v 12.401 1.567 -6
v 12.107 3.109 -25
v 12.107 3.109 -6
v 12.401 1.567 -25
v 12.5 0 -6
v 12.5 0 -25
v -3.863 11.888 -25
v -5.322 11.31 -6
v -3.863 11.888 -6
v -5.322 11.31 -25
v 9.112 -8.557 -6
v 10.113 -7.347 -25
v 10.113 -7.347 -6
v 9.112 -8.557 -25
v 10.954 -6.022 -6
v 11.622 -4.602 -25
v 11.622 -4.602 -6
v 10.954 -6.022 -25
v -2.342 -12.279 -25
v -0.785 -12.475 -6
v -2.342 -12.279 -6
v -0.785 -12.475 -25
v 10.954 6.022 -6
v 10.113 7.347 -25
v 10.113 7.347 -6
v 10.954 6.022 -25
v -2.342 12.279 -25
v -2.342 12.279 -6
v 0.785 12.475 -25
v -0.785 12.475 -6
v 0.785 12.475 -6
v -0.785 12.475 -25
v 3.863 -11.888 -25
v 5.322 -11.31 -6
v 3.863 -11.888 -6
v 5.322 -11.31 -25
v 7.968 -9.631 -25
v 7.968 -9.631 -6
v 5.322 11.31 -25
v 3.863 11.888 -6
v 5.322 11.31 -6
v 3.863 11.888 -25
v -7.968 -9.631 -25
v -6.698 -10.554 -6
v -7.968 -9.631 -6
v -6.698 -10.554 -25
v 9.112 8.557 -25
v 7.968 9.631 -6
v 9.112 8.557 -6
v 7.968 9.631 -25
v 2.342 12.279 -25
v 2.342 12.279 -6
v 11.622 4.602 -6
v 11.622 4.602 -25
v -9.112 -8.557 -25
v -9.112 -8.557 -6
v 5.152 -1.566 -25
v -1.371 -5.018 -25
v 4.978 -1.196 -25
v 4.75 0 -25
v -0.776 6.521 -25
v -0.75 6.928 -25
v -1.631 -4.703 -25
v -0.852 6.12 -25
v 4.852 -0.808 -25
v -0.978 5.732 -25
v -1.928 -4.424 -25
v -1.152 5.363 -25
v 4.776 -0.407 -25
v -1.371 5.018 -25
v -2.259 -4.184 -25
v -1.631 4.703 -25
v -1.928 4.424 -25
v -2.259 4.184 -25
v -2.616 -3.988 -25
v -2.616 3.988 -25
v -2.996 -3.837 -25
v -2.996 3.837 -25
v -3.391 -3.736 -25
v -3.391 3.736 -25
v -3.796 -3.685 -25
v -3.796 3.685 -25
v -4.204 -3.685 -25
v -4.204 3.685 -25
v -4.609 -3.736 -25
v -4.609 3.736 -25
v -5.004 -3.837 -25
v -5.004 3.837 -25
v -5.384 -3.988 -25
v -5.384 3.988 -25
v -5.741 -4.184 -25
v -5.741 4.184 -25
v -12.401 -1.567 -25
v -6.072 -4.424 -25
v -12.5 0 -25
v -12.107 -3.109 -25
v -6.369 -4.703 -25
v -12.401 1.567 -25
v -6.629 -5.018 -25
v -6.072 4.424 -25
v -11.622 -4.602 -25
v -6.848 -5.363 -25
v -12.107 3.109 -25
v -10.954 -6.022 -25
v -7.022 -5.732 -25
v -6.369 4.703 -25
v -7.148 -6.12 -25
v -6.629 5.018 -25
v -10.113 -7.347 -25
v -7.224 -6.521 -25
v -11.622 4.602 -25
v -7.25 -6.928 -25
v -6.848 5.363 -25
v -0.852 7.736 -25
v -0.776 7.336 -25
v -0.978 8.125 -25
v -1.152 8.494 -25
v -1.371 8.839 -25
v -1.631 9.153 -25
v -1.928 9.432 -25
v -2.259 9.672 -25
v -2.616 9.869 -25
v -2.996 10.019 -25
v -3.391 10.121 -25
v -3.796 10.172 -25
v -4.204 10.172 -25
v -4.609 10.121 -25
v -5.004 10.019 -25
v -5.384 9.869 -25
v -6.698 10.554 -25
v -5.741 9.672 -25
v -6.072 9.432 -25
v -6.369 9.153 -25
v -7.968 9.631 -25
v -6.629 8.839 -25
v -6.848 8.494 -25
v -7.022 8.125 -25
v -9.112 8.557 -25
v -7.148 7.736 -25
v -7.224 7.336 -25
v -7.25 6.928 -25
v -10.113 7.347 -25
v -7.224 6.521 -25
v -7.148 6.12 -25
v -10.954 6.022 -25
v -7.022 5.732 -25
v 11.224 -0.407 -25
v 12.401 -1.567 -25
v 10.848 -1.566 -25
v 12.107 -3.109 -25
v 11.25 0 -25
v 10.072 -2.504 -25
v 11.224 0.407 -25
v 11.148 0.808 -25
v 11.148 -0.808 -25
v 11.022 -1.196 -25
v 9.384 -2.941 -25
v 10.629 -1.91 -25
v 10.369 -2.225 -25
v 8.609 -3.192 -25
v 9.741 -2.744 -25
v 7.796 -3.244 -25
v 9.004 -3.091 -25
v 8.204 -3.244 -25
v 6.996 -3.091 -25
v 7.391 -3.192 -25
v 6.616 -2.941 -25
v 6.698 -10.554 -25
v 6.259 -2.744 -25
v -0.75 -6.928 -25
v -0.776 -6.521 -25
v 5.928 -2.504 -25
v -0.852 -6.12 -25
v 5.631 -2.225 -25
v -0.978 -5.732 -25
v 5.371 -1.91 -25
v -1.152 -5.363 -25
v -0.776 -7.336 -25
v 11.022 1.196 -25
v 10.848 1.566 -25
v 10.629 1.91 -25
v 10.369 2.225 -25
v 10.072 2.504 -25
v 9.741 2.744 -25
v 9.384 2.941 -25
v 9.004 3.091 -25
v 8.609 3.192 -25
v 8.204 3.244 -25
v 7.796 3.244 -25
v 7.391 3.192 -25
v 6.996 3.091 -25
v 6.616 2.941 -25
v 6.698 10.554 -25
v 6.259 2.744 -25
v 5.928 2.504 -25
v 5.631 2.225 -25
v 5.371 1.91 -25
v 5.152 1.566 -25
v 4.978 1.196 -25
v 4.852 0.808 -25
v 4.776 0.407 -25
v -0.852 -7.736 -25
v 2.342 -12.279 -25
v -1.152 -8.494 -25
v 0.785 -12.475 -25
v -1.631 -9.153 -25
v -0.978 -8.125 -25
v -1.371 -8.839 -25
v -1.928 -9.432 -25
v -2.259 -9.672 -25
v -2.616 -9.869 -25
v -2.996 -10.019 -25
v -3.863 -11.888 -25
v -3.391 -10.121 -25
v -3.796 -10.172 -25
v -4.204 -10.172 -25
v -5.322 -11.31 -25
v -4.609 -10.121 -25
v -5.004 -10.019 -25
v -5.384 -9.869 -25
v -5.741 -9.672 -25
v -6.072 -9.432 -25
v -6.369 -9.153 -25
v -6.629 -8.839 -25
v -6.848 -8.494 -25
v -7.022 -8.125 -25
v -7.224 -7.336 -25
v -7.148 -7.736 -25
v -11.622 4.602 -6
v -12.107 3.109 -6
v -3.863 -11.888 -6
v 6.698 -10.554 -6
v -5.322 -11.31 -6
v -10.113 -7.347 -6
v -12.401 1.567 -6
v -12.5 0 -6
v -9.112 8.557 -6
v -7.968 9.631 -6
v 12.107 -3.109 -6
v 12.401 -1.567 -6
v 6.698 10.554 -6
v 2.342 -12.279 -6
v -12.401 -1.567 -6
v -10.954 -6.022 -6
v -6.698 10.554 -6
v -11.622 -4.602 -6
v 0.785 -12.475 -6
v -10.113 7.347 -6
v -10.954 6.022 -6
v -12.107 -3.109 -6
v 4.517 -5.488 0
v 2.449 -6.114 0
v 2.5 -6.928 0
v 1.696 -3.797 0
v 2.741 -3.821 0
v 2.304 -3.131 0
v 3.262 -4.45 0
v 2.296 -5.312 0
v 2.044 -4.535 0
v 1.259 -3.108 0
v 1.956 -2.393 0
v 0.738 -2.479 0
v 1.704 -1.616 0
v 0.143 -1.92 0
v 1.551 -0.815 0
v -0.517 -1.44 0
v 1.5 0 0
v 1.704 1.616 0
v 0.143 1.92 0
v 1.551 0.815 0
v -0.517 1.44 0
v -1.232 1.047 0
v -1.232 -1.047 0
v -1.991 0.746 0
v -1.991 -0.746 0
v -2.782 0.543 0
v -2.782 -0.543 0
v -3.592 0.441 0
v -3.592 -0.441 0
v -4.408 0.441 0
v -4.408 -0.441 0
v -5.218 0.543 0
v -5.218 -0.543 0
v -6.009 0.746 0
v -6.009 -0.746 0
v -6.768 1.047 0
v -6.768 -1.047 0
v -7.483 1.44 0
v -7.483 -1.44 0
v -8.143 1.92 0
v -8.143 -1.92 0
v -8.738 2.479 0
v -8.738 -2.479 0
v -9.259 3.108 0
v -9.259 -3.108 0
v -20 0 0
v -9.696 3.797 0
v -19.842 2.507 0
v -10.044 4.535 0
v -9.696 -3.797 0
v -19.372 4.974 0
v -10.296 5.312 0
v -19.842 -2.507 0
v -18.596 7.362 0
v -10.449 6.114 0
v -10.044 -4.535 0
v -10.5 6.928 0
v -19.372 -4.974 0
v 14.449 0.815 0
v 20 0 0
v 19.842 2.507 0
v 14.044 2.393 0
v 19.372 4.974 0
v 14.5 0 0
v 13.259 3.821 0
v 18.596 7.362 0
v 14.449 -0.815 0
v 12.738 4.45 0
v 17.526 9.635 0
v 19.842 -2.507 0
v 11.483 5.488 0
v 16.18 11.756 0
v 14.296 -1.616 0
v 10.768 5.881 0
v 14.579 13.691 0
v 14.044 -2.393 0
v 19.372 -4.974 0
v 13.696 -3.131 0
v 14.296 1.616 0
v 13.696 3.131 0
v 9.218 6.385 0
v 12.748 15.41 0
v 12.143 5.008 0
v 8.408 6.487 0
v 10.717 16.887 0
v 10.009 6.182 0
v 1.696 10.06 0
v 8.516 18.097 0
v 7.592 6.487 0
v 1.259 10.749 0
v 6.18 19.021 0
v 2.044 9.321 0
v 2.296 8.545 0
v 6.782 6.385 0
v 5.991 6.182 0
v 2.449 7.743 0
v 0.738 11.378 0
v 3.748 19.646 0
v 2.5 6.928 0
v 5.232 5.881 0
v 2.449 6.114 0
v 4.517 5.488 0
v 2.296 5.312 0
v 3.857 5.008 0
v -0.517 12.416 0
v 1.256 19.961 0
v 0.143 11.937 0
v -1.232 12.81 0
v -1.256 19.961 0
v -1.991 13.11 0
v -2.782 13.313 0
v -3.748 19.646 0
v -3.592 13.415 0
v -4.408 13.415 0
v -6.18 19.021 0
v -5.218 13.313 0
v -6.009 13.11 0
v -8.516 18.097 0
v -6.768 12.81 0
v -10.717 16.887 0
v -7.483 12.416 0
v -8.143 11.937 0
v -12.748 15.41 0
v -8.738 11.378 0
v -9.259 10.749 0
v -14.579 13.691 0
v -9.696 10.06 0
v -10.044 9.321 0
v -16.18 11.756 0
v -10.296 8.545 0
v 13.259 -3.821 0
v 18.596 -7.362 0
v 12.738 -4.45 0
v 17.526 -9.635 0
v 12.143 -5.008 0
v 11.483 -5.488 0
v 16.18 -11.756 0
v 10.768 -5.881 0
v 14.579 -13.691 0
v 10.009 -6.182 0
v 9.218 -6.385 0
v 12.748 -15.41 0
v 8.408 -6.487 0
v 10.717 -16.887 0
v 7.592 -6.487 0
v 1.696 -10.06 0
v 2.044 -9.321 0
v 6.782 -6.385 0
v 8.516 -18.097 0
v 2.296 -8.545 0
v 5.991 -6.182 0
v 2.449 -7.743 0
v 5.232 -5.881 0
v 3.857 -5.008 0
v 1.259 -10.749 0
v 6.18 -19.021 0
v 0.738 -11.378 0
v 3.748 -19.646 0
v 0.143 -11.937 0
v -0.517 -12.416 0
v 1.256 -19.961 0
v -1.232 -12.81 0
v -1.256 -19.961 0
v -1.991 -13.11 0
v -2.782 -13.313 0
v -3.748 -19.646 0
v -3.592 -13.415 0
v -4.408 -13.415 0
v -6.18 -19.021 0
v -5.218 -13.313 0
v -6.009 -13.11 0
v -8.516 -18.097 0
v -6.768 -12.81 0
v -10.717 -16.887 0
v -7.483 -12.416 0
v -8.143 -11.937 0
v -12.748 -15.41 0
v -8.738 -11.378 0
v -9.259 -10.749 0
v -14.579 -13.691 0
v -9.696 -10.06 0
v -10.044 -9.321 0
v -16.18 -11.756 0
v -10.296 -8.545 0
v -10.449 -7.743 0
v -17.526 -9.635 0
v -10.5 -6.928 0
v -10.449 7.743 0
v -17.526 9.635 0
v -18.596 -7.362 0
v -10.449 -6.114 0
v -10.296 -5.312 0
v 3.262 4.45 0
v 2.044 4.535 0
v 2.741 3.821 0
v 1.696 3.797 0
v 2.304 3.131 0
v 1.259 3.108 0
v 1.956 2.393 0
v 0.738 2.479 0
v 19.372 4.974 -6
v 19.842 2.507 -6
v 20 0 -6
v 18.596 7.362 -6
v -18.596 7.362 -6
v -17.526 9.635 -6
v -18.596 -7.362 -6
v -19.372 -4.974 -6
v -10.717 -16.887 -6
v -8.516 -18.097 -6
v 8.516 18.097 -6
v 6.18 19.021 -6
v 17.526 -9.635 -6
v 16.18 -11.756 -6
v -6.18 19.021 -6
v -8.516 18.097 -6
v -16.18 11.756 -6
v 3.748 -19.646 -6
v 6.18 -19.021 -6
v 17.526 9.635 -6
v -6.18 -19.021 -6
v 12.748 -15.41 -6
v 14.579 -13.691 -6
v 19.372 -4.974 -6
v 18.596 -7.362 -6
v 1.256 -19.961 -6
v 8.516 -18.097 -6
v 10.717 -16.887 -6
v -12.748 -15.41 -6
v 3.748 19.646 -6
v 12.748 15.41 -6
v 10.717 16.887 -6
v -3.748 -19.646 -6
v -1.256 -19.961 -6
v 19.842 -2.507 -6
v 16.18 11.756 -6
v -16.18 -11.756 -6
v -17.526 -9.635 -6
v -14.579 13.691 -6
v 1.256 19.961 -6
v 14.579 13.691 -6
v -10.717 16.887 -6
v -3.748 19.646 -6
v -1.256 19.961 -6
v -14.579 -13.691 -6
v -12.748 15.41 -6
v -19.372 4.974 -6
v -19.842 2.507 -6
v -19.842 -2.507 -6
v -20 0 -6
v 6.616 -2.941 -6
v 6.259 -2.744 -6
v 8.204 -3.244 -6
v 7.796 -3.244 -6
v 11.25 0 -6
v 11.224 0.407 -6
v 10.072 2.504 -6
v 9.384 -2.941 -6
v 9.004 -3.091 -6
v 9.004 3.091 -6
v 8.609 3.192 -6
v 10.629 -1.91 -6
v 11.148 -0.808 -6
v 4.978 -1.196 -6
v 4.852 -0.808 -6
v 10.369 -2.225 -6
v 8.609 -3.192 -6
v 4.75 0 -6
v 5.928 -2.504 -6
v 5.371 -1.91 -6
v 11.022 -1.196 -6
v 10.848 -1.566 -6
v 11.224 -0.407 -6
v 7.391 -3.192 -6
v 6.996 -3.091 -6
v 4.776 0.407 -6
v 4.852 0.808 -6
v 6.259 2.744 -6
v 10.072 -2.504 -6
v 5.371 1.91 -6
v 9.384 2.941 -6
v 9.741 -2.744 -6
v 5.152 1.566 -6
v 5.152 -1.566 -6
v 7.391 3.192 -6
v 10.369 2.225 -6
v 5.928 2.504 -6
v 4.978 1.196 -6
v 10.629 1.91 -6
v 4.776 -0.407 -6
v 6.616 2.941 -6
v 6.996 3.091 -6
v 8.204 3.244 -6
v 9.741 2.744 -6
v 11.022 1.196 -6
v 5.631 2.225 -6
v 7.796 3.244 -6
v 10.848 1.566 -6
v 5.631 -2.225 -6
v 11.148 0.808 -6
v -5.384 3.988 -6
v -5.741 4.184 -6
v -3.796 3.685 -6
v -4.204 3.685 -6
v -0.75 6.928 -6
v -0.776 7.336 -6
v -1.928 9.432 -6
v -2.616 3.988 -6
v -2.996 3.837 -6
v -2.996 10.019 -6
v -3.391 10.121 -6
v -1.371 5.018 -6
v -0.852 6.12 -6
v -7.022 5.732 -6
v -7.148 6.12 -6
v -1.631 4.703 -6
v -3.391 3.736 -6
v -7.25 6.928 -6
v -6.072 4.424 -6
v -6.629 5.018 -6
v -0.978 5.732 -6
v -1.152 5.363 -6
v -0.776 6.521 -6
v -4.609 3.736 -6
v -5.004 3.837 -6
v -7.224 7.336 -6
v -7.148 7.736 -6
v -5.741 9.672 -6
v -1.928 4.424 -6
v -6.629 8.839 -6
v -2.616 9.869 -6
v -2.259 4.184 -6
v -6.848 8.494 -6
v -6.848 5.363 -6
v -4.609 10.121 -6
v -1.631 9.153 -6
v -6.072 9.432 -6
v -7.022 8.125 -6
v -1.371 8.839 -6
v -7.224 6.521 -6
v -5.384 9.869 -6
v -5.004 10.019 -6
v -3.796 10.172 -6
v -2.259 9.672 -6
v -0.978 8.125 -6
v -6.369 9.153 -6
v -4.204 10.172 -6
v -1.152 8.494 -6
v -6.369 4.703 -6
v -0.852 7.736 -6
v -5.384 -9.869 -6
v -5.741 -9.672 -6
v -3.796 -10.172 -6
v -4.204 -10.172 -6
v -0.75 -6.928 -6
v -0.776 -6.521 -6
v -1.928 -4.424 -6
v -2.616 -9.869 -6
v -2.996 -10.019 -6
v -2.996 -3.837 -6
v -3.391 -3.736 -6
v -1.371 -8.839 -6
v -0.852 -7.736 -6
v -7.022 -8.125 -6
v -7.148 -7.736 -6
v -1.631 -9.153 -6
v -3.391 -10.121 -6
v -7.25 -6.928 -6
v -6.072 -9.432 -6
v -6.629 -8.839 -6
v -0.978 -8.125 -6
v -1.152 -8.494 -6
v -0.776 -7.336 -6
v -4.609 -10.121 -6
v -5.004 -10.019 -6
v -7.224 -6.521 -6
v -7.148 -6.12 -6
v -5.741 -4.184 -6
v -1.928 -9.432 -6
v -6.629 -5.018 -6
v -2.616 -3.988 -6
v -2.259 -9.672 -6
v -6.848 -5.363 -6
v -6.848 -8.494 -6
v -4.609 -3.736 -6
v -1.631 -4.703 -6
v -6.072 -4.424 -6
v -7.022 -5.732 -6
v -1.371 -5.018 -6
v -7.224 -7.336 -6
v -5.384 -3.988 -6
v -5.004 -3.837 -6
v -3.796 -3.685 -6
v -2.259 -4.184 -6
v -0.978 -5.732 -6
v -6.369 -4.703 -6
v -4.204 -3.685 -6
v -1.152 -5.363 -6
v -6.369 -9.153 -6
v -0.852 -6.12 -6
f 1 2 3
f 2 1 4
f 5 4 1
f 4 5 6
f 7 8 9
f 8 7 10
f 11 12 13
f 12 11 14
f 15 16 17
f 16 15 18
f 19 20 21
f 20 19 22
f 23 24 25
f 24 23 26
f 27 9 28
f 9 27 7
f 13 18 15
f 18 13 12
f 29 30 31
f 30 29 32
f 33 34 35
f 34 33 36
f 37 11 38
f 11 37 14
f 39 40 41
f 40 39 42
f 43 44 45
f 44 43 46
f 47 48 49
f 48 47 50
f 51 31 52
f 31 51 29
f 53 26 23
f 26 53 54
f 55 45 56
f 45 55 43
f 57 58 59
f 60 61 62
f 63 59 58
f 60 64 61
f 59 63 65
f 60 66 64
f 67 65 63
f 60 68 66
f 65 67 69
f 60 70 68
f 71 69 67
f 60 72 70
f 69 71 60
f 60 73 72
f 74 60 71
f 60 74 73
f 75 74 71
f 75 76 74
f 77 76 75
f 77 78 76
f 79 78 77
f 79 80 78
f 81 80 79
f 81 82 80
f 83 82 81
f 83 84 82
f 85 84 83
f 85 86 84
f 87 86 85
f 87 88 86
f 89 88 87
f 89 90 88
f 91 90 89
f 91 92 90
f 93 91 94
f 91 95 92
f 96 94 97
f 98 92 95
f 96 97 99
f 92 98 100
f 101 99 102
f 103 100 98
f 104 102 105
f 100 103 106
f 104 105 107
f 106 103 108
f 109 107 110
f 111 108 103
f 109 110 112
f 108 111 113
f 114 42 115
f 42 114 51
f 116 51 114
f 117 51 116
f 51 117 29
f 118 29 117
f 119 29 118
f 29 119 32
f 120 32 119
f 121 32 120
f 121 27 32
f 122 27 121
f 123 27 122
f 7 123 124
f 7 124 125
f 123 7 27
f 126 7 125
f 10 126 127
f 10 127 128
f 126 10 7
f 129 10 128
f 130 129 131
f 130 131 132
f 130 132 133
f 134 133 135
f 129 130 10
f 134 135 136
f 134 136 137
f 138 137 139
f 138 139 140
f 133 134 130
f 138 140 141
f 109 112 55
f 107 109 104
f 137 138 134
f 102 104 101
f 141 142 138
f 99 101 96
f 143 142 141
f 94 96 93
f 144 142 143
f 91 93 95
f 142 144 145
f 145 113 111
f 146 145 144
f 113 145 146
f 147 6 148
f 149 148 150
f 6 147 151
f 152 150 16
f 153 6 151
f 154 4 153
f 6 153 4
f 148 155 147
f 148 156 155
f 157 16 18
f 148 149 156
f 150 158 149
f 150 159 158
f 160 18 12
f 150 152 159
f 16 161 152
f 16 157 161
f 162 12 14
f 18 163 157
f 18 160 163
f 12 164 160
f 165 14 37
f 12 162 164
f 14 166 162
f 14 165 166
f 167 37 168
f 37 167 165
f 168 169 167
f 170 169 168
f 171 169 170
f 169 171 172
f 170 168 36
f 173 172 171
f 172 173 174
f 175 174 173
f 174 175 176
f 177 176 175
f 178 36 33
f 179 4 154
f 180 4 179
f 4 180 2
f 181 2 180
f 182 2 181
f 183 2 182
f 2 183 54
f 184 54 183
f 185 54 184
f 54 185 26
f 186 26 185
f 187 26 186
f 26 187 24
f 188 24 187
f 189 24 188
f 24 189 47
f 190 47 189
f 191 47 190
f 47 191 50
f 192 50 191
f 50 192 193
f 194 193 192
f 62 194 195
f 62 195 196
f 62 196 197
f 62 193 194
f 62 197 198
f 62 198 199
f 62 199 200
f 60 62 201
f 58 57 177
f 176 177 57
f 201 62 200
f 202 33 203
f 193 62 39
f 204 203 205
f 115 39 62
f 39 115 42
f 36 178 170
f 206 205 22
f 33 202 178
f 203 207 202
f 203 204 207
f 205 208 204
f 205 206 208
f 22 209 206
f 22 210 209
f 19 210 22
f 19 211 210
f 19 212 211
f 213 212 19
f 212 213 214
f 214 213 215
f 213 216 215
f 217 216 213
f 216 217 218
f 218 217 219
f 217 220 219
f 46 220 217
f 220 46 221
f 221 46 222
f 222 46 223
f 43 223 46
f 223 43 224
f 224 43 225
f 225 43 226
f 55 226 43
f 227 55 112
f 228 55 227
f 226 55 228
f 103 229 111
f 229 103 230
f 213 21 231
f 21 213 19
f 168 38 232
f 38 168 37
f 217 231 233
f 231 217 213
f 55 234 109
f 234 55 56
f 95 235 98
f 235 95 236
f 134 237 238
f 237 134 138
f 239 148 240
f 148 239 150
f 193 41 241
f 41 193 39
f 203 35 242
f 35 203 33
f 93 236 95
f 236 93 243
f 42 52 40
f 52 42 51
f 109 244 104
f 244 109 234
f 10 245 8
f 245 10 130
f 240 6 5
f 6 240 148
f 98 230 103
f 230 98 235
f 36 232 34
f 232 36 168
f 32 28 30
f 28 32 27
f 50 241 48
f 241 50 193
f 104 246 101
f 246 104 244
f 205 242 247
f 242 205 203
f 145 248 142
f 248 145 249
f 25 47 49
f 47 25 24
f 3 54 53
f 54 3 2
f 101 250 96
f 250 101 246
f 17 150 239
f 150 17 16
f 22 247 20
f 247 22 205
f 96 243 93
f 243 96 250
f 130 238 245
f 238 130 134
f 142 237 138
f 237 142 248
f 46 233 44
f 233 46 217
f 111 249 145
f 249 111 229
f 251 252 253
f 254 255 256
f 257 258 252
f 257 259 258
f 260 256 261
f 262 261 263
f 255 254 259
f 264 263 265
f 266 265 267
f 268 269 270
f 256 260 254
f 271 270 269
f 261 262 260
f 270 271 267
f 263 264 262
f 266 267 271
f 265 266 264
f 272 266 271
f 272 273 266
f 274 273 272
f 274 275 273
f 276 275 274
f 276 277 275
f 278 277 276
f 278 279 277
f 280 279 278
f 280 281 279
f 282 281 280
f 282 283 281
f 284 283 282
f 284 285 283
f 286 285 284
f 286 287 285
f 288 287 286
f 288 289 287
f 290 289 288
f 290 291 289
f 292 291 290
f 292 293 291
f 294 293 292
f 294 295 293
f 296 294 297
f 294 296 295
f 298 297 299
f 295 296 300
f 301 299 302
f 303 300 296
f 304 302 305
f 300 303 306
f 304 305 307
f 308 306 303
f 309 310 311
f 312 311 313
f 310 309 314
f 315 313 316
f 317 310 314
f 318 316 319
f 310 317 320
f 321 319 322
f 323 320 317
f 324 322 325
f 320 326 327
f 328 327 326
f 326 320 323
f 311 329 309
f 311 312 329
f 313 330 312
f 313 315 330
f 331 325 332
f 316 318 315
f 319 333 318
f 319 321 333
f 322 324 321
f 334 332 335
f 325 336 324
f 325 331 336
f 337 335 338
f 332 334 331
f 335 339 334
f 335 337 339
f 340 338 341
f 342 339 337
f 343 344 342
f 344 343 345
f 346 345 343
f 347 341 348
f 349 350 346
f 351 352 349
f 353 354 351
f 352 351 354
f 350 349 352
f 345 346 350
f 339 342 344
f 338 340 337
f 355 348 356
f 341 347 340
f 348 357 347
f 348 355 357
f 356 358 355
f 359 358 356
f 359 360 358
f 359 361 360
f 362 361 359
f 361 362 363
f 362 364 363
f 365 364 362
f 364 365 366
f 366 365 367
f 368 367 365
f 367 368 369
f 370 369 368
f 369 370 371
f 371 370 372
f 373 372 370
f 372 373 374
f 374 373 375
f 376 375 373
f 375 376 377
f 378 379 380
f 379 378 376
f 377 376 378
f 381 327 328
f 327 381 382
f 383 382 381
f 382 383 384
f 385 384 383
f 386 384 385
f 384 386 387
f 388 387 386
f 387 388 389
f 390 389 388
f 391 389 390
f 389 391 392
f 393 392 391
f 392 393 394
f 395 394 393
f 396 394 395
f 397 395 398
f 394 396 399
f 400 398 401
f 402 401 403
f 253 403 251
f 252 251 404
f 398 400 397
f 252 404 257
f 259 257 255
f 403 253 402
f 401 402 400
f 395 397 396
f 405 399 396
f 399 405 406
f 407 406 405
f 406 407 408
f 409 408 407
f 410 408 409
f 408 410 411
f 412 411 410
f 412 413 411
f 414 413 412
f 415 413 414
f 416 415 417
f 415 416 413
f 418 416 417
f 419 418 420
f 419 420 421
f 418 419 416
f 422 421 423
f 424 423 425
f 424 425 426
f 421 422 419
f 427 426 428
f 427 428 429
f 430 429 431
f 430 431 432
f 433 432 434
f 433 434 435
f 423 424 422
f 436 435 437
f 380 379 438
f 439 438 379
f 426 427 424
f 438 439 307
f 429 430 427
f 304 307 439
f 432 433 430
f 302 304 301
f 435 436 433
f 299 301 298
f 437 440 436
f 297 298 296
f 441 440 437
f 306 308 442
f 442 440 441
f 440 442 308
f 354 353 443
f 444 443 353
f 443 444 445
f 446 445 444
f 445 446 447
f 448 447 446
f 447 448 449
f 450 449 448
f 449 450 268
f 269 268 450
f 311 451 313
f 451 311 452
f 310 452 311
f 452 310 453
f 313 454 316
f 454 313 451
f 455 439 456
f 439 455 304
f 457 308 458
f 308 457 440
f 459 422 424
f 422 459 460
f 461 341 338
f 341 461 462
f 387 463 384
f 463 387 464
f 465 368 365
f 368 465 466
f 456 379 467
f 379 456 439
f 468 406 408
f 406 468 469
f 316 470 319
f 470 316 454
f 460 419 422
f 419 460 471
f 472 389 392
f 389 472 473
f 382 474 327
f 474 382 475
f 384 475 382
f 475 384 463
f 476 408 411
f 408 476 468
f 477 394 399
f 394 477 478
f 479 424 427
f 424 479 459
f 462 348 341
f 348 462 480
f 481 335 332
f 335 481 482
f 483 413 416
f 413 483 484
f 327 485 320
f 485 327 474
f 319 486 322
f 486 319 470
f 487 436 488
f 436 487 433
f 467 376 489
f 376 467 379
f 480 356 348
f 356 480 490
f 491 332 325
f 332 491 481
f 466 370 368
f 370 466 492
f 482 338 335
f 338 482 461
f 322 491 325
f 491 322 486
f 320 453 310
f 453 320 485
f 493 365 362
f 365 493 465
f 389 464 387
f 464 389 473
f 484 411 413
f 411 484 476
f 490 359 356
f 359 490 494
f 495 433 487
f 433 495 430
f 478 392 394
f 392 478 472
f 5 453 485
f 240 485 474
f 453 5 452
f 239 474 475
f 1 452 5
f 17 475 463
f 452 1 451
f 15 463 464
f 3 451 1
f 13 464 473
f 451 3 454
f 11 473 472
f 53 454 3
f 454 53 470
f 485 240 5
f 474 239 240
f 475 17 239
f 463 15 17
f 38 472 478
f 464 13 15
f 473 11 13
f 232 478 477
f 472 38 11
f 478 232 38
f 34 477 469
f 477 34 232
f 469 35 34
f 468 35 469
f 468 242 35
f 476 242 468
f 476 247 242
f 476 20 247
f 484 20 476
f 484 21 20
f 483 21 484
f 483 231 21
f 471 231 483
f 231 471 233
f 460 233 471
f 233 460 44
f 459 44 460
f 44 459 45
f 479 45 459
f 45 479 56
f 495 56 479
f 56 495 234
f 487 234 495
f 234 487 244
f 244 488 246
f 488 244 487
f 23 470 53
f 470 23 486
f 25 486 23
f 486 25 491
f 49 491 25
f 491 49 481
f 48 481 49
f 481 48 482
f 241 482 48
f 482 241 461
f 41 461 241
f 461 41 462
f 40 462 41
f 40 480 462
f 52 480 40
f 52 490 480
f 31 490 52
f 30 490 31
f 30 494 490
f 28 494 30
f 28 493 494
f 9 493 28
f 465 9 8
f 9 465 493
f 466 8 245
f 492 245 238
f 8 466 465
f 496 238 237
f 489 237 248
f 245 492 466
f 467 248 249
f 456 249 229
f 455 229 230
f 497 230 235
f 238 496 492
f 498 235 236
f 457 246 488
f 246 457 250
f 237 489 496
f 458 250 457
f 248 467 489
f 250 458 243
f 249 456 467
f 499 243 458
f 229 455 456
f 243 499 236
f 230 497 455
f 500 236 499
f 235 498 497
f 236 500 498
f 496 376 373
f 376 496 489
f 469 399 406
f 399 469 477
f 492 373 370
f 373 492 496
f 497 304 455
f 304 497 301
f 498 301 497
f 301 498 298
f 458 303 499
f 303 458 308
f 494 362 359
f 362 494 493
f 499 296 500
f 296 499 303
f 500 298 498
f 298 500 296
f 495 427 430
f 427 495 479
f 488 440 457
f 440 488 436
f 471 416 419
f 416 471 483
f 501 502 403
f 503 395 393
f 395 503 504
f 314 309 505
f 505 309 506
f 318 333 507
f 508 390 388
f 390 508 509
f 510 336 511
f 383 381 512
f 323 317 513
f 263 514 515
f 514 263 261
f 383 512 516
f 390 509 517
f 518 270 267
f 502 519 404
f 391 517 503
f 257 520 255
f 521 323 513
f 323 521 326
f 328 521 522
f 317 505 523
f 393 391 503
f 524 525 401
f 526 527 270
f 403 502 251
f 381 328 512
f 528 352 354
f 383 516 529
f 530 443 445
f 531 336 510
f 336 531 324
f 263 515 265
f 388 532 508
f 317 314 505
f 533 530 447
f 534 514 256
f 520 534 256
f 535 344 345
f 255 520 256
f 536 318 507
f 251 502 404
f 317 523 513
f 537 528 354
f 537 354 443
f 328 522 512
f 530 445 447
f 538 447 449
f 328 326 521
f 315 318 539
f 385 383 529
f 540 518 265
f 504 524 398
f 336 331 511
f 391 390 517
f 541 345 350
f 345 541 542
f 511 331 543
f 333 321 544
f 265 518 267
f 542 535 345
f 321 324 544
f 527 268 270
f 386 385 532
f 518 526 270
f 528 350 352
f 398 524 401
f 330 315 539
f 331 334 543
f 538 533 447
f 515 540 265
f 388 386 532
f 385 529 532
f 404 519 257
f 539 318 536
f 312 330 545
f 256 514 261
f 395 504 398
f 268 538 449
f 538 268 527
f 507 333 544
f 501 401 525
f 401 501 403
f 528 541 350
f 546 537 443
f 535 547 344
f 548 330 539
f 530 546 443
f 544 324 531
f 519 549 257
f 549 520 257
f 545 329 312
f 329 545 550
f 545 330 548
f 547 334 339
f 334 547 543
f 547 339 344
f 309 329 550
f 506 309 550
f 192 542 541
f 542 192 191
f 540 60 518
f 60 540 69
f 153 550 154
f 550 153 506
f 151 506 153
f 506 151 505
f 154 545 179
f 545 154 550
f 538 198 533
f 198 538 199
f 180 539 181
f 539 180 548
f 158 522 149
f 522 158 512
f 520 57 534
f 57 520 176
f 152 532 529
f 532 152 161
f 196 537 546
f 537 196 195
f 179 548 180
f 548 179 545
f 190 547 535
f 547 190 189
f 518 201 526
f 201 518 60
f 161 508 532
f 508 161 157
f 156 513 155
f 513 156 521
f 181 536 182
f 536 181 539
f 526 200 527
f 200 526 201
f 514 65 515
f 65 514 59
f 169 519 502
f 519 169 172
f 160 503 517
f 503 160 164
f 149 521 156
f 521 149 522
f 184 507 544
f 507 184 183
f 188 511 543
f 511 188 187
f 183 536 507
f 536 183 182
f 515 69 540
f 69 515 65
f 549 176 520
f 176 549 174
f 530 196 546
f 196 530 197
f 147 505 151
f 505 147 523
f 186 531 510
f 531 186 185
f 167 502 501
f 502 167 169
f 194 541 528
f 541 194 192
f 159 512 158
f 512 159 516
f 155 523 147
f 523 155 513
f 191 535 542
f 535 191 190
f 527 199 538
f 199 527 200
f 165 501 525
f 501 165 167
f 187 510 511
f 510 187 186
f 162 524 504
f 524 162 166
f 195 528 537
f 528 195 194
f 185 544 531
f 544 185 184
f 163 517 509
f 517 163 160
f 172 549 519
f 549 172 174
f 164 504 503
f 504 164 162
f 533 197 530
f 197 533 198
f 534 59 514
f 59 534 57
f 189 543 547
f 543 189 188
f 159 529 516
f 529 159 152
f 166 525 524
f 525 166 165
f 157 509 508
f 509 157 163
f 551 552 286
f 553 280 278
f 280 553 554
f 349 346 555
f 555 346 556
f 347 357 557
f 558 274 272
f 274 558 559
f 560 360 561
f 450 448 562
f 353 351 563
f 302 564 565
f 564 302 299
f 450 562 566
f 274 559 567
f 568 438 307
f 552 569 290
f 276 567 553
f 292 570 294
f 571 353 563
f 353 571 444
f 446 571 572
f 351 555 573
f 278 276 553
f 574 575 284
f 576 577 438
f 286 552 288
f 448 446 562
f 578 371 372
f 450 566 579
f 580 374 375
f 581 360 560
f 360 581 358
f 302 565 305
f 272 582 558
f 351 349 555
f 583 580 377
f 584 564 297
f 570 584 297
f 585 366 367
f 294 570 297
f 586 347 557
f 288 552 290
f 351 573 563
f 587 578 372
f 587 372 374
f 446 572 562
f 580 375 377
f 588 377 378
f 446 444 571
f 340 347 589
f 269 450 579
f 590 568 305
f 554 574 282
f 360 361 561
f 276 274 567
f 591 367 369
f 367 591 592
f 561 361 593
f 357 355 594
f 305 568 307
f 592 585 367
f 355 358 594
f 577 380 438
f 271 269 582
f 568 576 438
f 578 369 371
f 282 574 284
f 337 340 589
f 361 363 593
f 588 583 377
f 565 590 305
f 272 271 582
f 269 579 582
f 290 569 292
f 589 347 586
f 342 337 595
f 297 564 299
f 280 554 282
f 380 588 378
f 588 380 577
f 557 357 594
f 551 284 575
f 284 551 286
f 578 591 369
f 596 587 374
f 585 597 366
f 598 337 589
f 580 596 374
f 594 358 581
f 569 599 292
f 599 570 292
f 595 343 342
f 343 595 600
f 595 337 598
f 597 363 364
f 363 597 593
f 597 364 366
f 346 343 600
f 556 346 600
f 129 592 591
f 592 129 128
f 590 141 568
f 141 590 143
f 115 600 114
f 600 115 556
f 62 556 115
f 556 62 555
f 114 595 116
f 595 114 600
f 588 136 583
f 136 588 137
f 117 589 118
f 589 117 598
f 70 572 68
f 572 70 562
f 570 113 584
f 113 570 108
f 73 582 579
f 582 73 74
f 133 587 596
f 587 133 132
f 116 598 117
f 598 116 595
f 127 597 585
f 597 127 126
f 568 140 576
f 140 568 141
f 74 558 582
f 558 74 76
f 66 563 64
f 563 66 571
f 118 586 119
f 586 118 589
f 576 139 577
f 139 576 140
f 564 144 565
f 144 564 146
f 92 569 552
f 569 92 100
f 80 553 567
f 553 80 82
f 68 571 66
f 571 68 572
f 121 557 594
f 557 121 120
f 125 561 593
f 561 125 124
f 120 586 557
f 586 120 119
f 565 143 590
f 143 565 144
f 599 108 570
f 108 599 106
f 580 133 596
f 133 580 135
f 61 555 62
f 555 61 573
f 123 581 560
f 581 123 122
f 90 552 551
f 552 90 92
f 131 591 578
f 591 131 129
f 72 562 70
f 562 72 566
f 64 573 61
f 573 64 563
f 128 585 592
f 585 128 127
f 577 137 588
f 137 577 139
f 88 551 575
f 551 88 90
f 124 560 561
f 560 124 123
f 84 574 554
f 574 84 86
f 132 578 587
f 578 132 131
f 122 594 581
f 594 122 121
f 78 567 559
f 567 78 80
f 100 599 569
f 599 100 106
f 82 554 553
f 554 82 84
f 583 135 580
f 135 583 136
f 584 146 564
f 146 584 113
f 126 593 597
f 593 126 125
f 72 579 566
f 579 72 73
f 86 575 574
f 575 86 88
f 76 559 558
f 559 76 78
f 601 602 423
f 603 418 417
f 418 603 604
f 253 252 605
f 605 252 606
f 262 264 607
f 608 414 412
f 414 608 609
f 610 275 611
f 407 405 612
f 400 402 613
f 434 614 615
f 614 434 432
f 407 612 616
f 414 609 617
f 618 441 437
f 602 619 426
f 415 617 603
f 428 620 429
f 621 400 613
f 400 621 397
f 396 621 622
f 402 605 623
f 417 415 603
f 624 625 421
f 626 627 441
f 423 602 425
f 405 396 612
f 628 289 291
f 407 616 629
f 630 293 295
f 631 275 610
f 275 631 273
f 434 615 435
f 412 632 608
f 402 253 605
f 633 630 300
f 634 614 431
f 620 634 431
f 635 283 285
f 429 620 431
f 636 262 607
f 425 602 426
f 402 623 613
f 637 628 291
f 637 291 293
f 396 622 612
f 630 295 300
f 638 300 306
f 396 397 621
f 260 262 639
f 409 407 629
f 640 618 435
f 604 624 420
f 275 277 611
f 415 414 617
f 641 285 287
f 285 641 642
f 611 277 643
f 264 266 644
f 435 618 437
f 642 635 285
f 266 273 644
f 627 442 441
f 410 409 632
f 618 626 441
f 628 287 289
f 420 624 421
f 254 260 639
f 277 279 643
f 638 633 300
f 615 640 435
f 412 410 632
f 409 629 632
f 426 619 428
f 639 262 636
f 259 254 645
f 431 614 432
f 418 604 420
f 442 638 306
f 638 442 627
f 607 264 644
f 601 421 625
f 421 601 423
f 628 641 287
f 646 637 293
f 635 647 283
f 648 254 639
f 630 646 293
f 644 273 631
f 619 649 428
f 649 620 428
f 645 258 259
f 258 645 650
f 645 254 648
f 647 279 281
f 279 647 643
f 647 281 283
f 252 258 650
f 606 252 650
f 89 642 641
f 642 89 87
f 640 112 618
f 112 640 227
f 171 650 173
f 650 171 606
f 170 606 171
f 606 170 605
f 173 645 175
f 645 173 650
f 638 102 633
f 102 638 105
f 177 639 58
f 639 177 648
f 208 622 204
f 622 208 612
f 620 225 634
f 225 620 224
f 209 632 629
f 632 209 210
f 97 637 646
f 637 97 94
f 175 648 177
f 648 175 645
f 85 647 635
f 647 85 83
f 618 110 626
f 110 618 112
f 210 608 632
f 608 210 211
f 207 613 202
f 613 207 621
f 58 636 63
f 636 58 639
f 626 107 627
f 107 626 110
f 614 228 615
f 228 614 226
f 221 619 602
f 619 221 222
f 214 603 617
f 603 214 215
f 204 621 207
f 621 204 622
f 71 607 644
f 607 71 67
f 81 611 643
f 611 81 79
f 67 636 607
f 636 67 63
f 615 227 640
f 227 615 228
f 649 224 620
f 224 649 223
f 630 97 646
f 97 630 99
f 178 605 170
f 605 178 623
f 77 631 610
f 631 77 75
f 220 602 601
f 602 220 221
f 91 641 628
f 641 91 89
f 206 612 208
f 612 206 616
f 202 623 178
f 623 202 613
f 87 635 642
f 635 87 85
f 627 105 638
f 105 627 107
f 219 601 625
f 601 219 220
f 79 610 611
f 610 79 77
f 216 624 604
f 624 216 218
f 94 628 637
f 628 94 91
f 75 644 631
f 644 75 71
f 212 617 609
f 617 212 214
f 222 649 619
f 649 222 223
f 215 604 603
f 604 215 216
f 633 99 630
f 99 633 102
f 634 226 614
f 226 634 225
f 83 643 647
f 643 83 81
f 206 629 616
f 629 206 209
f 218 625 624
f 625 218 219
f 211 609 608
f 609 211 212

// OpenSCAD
$fn = 50;


difference() {
	union() {
		translate(v = [0, 0, -25.0000000000]) {
			cylinder(h = 25, r = 12.5000000000);
		}
		translate(v = [0, 0, -6.0000000000]) {
			cylinder(h = 6, r = 20.0000000000);
		}
	}
	union() {
		translate(v = [8.0000000000, 0.0000000000, 0]) {
			rotate(a = [0, 0, 0]) {
				difference() {
					union() {
						#translate(v = [0, 0, -25.0000000000]) {
							cylinder(h = 25, r = 2.2500000000);
						}
						#translate(v = [0, 0, -6]) {
							cylinder(h = 6, r = 12.5000000000, r1 = 3.2500000000, r2 = 6.5000000000);
						}
						#translate(v = [0, 0, -25.0000000000]) {
							cylinder(h = 25, r = 3.2500000000);
						}
						#translate(v = [0, 0, -25.0000000000]) {
							cylinder(h = 25, r = 2.2500000000);
						}
					}
					union();
				}
			}
		}
		translate(v = [-4.0000000000, 6.9282032303, 0]) {
			rotate(a = [0, 0, 0]) {
				difference() {
					union() {
						#translate(v = [0, 0, -25.0000000000]) {
							cylinder(h = 25, r = 2.2500000000);
						}
						#translate(v = [0, 0, -6]) {
							cylinder(h = 6, r = 12.5000000000, r1 = 3.2500000000, r2 = 6.5000000000);
						}
						#translate(v = [0, 0, -25.0000000000]) {
							cylinder(h = 25, r = 3.2500000000);
						}
						#translate(v = [0, 0, -25.0000000000]) {
							cylinder(h = 25, r = 2.2500000000);
						}
					}
					union();
				}
			}
		}
		translate(v = [-4.0000000000, -6.9282032303, 0]) {
			rotate(a = [0, 0, 0]) {
				difference() {
					union() {
						#translate(v = [0, 0, -25.0000000000]) {
							cylinder(h = 25, r = 2.2500000000);
						}
						#translate(v = [0, 0, -6]) {
							cylinder(h = 6, r = 12.5000000000, r1 = 3.2500000000, r2 = 6.5000000000);
						}
						#translate(v = [0, 0, -25.0000000000]) {
							cylinder(h = 25, r = 3.2500000000);
						}
						#translate(v = [0, 0, -25.0000000000]) {
							cylinder(h = 25, r = 2.2500000000);
						}
					}
					union();
				}
			}
		}
	}
}
